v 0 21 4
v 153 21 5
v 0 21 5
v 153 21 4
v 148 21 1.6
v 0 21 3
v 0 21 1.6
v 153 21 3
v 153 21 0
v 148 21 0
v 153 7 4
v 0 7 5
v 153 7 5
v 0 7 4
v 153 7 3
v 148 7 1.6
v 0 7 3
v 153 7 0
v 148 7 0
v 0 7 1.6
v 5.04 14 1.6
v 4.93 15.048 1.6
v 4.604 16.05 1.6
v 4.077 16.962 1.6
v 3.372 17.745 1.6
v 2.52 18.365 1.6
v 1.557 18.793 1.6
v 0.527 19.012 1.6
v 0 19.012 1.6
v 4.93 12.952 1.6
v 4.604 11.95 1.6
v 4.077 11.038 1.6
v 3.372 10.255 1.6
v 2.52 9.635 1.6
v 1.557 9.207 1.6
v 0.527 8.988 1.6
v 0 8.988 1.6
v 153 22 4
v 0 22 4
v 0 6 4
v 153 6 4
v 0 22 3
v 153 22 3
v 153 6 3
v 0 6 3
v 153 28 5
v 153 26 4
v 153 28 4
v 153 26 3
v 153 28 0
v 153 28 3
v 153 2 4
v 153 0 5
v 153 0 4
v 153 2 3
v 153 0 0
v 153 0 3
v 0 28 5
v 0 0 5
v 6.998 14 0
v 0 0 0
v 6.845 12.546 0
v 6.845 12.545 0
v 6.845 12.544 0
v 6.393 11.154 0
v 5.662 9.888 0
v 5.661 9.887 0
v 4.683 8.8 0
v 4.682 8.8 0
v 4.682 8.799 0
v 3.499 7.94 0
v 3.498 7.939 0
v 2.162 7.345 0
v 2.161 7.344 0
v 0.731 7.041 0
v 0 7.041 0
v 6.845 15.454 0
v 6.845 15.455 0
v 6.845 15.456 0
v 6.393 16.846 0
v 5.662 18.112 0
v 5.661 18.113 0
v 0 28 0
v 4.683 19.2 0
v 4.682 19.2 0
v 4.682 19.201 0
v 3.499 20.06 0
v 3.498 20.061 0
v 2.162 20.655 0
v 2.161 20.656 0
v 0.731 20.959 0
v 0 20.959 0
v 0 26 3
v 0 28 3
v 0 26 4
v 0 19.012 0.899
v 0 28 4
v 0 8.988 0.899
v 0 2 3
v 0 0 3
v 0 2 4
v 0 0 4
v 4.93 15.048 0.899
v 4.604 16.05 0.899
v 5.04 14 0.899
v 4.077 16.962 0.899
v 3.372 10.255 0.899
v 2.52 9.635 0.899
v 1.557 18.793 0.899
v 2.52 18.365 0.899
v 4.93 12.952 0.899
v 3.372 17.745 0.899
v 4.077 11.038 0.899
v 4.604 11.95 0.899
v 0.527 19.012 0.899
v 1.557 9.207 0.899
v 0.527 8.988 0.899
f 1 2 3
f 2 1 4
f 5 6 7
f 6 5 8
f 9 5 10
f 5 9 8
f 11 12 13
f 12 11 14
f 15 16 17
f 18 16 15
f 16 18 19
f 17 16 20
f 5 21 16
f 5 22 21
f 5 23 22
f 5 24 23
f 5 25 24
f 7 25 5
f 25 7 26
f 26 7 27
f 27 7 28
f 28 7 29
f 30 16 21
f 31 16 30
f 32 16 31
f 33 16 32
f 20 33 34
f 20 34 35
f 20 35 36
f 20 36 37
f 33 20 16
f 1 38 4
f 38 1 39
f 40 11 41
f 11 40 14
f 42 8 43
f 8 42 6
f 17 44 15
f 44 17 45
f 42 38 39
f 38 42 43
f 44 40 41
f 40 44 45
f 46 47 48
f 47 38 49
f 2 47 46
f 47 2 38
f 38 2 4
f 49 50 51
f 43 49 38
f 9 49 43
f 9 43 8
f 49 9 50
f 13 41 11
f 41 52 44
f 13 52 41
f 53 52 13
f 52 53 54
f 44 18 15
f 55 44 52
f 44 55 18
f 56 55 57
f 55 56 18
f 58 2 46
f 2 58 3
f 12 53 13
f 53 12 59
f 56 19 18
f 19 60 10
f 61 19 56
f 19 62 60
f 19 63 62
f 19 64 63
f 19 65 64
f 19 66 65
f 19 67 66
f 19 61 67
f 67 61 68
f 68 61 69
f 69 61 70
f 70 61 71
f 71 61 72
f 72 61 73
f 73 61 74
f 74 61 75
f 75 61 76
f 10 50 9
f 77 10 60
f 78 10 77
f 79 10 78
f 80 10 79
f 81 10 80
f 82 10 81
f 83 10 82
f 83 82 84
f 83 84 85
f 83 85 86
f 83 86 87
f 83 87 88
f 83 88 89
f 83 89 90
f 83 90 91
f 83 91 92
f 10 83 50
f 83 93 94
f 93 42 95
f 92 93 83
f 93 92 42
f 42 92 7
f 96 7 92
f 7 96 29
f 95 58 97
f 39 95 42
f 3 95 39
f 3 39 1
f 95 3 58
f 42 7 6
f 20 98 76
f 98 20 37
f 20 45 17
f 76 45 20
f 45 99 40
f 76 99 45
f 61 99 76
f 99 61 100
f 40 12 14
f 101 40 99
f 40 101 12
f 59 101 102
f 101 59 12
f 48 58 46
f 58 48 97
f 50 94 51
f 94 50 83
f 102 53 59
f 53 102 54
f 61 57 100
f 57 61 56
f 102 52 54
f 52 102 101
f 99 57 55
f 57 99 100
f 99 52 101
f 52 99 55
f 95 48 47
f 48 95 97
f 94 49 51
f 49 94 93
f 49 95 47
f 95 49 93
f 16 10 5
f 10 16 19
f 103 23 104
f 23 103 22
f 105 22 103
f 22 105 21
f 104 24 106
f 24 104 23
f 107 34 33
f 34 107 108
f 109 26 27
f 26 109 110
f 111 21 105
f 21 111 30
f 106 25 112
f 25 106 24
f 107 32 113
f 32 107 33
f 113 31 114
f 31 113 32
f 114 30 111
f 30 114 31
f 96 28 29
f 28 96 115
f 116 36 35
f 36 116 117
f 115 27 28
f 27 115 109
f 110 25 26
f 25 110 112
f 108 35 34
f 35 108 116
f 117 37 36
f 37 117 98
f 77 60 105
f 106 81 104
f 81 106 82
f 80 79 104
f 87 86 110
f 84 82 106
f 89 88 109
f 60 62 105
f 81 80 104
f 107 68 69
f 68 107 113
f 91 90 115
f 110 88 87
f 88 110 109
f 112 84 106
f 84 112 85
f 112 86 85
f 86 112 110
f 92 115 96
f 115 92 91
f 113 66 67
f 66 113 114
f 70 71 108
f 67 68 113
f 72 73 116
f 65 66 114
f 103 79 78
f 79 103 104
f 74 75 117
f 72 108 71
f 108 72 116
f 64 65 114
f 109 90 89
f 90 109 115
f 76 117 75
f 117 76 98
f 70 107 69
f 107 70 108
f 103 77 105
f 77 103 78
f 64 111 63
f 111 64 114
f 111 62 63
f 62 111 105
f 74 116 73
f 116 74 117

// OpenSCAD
// file: slide-rule-slider.scad
//Width X is along the rule
//Length Y is perpendicular to the rule
//Height Z is vertical
module slider (
    dispLength=10, 
    totalLength=12, 
    width=80,
    height=3, 
    railHeight=1,
    subtraction=false
    ){
    widthOffset = subtraction ? -2 : 0;
    width = subtraction ? width+4 : width;
    //display
    translate([widthOffset, (totalLength-dispLength)/2, 0]){
        cube([width, dispLength, height]);
    }
    //rails
    translate([widthOffset, 0, (height/2)-(railHeight/2)]){
        cube([width, totalLength, railHeight]);
    }
    if (subtraction){
        translate([widthOffset, (totalLength-dispLength)/2, height-1]){
            cube([width, dispLength, height]);
        }
        translate([widthOffset, (totalLength-dispLength)/2, -0.4]){
            cube([width, dispLength, height]);
        }
    }
}

//Default slider
slider();

//Slider that will be used for subtraction
translate([0, 15, 0]){
    slider(subtraction=true);
}
// main file
//Width X is along the rule
//Length Y is perpendicular to the rule
//Height Z is vertical
use <slide-rule-slider.scad>

module body (
    width=153,
    totalLength=28,
    totalHeight=5,
    sliderTY=6,
    sliderTZ=2,
    sliderDispLength=14,
    sliderTotalLength=16,
    sliderHeight=3,
    railHeight=1,
    outsideRailLength=2,
    cutoutWidth=5
    ){
    difference(){
        difference(){
            difference(){
                difference(){
                    cube([width, totalLength, totalHeight]);
                    translate([0, sliderTY, sliderTZ])
                    slider(
                        dispLength=sliderDispLength,
                        totalLength=sliderTotalLength,
                        width=width,
                        height=sliderHeight,
                        railHeight=railHeight,
                        subtraction=true
                    );
                }
                outsideRails(
                    width=width,
                    totalLength=totalLength,
                    railHeight=railHeight,
                    outsideRailLength=outsideRailLength,
                    railTZ=sliderTZ+(sliderHeight/2)-(railHeight/2)
                );
            }
            translate([width-cutoutWidth, sliderTY+((sliderTotalLength-sliderDispLength)/2), -0.5]){
                cube([cutoutWidth+1, sliderDispLength, sliderTZ+1]);
            }
        }
        translate([0, totalLength/2, -0.001]){
            cylinder(r=sliderDispLength*0.72/2, h=2, $fn=30);
            cylinder(r1=sliderDispLength/2, r2=sliderDispLength*0.72/2, h=0.9, $fn=30);
        }
    }
}

module outsideRails (
    width=153,
    totalLength=28,
    railHeight=1,
    outsideRailLength=2,
    railTZ
    ){
    incWidth=2;
    translate([-incWidth/2, -1, railTZ]){
        cube([width+incWidth, outsideRailLength+1, railHeight]);
    }
    translate([-incWidth/2, totalLength-outsideRailLength, railTZ]){
        cube([width+incWidth, outsideRailLength+1, railHeight]);
    }
}

body();
